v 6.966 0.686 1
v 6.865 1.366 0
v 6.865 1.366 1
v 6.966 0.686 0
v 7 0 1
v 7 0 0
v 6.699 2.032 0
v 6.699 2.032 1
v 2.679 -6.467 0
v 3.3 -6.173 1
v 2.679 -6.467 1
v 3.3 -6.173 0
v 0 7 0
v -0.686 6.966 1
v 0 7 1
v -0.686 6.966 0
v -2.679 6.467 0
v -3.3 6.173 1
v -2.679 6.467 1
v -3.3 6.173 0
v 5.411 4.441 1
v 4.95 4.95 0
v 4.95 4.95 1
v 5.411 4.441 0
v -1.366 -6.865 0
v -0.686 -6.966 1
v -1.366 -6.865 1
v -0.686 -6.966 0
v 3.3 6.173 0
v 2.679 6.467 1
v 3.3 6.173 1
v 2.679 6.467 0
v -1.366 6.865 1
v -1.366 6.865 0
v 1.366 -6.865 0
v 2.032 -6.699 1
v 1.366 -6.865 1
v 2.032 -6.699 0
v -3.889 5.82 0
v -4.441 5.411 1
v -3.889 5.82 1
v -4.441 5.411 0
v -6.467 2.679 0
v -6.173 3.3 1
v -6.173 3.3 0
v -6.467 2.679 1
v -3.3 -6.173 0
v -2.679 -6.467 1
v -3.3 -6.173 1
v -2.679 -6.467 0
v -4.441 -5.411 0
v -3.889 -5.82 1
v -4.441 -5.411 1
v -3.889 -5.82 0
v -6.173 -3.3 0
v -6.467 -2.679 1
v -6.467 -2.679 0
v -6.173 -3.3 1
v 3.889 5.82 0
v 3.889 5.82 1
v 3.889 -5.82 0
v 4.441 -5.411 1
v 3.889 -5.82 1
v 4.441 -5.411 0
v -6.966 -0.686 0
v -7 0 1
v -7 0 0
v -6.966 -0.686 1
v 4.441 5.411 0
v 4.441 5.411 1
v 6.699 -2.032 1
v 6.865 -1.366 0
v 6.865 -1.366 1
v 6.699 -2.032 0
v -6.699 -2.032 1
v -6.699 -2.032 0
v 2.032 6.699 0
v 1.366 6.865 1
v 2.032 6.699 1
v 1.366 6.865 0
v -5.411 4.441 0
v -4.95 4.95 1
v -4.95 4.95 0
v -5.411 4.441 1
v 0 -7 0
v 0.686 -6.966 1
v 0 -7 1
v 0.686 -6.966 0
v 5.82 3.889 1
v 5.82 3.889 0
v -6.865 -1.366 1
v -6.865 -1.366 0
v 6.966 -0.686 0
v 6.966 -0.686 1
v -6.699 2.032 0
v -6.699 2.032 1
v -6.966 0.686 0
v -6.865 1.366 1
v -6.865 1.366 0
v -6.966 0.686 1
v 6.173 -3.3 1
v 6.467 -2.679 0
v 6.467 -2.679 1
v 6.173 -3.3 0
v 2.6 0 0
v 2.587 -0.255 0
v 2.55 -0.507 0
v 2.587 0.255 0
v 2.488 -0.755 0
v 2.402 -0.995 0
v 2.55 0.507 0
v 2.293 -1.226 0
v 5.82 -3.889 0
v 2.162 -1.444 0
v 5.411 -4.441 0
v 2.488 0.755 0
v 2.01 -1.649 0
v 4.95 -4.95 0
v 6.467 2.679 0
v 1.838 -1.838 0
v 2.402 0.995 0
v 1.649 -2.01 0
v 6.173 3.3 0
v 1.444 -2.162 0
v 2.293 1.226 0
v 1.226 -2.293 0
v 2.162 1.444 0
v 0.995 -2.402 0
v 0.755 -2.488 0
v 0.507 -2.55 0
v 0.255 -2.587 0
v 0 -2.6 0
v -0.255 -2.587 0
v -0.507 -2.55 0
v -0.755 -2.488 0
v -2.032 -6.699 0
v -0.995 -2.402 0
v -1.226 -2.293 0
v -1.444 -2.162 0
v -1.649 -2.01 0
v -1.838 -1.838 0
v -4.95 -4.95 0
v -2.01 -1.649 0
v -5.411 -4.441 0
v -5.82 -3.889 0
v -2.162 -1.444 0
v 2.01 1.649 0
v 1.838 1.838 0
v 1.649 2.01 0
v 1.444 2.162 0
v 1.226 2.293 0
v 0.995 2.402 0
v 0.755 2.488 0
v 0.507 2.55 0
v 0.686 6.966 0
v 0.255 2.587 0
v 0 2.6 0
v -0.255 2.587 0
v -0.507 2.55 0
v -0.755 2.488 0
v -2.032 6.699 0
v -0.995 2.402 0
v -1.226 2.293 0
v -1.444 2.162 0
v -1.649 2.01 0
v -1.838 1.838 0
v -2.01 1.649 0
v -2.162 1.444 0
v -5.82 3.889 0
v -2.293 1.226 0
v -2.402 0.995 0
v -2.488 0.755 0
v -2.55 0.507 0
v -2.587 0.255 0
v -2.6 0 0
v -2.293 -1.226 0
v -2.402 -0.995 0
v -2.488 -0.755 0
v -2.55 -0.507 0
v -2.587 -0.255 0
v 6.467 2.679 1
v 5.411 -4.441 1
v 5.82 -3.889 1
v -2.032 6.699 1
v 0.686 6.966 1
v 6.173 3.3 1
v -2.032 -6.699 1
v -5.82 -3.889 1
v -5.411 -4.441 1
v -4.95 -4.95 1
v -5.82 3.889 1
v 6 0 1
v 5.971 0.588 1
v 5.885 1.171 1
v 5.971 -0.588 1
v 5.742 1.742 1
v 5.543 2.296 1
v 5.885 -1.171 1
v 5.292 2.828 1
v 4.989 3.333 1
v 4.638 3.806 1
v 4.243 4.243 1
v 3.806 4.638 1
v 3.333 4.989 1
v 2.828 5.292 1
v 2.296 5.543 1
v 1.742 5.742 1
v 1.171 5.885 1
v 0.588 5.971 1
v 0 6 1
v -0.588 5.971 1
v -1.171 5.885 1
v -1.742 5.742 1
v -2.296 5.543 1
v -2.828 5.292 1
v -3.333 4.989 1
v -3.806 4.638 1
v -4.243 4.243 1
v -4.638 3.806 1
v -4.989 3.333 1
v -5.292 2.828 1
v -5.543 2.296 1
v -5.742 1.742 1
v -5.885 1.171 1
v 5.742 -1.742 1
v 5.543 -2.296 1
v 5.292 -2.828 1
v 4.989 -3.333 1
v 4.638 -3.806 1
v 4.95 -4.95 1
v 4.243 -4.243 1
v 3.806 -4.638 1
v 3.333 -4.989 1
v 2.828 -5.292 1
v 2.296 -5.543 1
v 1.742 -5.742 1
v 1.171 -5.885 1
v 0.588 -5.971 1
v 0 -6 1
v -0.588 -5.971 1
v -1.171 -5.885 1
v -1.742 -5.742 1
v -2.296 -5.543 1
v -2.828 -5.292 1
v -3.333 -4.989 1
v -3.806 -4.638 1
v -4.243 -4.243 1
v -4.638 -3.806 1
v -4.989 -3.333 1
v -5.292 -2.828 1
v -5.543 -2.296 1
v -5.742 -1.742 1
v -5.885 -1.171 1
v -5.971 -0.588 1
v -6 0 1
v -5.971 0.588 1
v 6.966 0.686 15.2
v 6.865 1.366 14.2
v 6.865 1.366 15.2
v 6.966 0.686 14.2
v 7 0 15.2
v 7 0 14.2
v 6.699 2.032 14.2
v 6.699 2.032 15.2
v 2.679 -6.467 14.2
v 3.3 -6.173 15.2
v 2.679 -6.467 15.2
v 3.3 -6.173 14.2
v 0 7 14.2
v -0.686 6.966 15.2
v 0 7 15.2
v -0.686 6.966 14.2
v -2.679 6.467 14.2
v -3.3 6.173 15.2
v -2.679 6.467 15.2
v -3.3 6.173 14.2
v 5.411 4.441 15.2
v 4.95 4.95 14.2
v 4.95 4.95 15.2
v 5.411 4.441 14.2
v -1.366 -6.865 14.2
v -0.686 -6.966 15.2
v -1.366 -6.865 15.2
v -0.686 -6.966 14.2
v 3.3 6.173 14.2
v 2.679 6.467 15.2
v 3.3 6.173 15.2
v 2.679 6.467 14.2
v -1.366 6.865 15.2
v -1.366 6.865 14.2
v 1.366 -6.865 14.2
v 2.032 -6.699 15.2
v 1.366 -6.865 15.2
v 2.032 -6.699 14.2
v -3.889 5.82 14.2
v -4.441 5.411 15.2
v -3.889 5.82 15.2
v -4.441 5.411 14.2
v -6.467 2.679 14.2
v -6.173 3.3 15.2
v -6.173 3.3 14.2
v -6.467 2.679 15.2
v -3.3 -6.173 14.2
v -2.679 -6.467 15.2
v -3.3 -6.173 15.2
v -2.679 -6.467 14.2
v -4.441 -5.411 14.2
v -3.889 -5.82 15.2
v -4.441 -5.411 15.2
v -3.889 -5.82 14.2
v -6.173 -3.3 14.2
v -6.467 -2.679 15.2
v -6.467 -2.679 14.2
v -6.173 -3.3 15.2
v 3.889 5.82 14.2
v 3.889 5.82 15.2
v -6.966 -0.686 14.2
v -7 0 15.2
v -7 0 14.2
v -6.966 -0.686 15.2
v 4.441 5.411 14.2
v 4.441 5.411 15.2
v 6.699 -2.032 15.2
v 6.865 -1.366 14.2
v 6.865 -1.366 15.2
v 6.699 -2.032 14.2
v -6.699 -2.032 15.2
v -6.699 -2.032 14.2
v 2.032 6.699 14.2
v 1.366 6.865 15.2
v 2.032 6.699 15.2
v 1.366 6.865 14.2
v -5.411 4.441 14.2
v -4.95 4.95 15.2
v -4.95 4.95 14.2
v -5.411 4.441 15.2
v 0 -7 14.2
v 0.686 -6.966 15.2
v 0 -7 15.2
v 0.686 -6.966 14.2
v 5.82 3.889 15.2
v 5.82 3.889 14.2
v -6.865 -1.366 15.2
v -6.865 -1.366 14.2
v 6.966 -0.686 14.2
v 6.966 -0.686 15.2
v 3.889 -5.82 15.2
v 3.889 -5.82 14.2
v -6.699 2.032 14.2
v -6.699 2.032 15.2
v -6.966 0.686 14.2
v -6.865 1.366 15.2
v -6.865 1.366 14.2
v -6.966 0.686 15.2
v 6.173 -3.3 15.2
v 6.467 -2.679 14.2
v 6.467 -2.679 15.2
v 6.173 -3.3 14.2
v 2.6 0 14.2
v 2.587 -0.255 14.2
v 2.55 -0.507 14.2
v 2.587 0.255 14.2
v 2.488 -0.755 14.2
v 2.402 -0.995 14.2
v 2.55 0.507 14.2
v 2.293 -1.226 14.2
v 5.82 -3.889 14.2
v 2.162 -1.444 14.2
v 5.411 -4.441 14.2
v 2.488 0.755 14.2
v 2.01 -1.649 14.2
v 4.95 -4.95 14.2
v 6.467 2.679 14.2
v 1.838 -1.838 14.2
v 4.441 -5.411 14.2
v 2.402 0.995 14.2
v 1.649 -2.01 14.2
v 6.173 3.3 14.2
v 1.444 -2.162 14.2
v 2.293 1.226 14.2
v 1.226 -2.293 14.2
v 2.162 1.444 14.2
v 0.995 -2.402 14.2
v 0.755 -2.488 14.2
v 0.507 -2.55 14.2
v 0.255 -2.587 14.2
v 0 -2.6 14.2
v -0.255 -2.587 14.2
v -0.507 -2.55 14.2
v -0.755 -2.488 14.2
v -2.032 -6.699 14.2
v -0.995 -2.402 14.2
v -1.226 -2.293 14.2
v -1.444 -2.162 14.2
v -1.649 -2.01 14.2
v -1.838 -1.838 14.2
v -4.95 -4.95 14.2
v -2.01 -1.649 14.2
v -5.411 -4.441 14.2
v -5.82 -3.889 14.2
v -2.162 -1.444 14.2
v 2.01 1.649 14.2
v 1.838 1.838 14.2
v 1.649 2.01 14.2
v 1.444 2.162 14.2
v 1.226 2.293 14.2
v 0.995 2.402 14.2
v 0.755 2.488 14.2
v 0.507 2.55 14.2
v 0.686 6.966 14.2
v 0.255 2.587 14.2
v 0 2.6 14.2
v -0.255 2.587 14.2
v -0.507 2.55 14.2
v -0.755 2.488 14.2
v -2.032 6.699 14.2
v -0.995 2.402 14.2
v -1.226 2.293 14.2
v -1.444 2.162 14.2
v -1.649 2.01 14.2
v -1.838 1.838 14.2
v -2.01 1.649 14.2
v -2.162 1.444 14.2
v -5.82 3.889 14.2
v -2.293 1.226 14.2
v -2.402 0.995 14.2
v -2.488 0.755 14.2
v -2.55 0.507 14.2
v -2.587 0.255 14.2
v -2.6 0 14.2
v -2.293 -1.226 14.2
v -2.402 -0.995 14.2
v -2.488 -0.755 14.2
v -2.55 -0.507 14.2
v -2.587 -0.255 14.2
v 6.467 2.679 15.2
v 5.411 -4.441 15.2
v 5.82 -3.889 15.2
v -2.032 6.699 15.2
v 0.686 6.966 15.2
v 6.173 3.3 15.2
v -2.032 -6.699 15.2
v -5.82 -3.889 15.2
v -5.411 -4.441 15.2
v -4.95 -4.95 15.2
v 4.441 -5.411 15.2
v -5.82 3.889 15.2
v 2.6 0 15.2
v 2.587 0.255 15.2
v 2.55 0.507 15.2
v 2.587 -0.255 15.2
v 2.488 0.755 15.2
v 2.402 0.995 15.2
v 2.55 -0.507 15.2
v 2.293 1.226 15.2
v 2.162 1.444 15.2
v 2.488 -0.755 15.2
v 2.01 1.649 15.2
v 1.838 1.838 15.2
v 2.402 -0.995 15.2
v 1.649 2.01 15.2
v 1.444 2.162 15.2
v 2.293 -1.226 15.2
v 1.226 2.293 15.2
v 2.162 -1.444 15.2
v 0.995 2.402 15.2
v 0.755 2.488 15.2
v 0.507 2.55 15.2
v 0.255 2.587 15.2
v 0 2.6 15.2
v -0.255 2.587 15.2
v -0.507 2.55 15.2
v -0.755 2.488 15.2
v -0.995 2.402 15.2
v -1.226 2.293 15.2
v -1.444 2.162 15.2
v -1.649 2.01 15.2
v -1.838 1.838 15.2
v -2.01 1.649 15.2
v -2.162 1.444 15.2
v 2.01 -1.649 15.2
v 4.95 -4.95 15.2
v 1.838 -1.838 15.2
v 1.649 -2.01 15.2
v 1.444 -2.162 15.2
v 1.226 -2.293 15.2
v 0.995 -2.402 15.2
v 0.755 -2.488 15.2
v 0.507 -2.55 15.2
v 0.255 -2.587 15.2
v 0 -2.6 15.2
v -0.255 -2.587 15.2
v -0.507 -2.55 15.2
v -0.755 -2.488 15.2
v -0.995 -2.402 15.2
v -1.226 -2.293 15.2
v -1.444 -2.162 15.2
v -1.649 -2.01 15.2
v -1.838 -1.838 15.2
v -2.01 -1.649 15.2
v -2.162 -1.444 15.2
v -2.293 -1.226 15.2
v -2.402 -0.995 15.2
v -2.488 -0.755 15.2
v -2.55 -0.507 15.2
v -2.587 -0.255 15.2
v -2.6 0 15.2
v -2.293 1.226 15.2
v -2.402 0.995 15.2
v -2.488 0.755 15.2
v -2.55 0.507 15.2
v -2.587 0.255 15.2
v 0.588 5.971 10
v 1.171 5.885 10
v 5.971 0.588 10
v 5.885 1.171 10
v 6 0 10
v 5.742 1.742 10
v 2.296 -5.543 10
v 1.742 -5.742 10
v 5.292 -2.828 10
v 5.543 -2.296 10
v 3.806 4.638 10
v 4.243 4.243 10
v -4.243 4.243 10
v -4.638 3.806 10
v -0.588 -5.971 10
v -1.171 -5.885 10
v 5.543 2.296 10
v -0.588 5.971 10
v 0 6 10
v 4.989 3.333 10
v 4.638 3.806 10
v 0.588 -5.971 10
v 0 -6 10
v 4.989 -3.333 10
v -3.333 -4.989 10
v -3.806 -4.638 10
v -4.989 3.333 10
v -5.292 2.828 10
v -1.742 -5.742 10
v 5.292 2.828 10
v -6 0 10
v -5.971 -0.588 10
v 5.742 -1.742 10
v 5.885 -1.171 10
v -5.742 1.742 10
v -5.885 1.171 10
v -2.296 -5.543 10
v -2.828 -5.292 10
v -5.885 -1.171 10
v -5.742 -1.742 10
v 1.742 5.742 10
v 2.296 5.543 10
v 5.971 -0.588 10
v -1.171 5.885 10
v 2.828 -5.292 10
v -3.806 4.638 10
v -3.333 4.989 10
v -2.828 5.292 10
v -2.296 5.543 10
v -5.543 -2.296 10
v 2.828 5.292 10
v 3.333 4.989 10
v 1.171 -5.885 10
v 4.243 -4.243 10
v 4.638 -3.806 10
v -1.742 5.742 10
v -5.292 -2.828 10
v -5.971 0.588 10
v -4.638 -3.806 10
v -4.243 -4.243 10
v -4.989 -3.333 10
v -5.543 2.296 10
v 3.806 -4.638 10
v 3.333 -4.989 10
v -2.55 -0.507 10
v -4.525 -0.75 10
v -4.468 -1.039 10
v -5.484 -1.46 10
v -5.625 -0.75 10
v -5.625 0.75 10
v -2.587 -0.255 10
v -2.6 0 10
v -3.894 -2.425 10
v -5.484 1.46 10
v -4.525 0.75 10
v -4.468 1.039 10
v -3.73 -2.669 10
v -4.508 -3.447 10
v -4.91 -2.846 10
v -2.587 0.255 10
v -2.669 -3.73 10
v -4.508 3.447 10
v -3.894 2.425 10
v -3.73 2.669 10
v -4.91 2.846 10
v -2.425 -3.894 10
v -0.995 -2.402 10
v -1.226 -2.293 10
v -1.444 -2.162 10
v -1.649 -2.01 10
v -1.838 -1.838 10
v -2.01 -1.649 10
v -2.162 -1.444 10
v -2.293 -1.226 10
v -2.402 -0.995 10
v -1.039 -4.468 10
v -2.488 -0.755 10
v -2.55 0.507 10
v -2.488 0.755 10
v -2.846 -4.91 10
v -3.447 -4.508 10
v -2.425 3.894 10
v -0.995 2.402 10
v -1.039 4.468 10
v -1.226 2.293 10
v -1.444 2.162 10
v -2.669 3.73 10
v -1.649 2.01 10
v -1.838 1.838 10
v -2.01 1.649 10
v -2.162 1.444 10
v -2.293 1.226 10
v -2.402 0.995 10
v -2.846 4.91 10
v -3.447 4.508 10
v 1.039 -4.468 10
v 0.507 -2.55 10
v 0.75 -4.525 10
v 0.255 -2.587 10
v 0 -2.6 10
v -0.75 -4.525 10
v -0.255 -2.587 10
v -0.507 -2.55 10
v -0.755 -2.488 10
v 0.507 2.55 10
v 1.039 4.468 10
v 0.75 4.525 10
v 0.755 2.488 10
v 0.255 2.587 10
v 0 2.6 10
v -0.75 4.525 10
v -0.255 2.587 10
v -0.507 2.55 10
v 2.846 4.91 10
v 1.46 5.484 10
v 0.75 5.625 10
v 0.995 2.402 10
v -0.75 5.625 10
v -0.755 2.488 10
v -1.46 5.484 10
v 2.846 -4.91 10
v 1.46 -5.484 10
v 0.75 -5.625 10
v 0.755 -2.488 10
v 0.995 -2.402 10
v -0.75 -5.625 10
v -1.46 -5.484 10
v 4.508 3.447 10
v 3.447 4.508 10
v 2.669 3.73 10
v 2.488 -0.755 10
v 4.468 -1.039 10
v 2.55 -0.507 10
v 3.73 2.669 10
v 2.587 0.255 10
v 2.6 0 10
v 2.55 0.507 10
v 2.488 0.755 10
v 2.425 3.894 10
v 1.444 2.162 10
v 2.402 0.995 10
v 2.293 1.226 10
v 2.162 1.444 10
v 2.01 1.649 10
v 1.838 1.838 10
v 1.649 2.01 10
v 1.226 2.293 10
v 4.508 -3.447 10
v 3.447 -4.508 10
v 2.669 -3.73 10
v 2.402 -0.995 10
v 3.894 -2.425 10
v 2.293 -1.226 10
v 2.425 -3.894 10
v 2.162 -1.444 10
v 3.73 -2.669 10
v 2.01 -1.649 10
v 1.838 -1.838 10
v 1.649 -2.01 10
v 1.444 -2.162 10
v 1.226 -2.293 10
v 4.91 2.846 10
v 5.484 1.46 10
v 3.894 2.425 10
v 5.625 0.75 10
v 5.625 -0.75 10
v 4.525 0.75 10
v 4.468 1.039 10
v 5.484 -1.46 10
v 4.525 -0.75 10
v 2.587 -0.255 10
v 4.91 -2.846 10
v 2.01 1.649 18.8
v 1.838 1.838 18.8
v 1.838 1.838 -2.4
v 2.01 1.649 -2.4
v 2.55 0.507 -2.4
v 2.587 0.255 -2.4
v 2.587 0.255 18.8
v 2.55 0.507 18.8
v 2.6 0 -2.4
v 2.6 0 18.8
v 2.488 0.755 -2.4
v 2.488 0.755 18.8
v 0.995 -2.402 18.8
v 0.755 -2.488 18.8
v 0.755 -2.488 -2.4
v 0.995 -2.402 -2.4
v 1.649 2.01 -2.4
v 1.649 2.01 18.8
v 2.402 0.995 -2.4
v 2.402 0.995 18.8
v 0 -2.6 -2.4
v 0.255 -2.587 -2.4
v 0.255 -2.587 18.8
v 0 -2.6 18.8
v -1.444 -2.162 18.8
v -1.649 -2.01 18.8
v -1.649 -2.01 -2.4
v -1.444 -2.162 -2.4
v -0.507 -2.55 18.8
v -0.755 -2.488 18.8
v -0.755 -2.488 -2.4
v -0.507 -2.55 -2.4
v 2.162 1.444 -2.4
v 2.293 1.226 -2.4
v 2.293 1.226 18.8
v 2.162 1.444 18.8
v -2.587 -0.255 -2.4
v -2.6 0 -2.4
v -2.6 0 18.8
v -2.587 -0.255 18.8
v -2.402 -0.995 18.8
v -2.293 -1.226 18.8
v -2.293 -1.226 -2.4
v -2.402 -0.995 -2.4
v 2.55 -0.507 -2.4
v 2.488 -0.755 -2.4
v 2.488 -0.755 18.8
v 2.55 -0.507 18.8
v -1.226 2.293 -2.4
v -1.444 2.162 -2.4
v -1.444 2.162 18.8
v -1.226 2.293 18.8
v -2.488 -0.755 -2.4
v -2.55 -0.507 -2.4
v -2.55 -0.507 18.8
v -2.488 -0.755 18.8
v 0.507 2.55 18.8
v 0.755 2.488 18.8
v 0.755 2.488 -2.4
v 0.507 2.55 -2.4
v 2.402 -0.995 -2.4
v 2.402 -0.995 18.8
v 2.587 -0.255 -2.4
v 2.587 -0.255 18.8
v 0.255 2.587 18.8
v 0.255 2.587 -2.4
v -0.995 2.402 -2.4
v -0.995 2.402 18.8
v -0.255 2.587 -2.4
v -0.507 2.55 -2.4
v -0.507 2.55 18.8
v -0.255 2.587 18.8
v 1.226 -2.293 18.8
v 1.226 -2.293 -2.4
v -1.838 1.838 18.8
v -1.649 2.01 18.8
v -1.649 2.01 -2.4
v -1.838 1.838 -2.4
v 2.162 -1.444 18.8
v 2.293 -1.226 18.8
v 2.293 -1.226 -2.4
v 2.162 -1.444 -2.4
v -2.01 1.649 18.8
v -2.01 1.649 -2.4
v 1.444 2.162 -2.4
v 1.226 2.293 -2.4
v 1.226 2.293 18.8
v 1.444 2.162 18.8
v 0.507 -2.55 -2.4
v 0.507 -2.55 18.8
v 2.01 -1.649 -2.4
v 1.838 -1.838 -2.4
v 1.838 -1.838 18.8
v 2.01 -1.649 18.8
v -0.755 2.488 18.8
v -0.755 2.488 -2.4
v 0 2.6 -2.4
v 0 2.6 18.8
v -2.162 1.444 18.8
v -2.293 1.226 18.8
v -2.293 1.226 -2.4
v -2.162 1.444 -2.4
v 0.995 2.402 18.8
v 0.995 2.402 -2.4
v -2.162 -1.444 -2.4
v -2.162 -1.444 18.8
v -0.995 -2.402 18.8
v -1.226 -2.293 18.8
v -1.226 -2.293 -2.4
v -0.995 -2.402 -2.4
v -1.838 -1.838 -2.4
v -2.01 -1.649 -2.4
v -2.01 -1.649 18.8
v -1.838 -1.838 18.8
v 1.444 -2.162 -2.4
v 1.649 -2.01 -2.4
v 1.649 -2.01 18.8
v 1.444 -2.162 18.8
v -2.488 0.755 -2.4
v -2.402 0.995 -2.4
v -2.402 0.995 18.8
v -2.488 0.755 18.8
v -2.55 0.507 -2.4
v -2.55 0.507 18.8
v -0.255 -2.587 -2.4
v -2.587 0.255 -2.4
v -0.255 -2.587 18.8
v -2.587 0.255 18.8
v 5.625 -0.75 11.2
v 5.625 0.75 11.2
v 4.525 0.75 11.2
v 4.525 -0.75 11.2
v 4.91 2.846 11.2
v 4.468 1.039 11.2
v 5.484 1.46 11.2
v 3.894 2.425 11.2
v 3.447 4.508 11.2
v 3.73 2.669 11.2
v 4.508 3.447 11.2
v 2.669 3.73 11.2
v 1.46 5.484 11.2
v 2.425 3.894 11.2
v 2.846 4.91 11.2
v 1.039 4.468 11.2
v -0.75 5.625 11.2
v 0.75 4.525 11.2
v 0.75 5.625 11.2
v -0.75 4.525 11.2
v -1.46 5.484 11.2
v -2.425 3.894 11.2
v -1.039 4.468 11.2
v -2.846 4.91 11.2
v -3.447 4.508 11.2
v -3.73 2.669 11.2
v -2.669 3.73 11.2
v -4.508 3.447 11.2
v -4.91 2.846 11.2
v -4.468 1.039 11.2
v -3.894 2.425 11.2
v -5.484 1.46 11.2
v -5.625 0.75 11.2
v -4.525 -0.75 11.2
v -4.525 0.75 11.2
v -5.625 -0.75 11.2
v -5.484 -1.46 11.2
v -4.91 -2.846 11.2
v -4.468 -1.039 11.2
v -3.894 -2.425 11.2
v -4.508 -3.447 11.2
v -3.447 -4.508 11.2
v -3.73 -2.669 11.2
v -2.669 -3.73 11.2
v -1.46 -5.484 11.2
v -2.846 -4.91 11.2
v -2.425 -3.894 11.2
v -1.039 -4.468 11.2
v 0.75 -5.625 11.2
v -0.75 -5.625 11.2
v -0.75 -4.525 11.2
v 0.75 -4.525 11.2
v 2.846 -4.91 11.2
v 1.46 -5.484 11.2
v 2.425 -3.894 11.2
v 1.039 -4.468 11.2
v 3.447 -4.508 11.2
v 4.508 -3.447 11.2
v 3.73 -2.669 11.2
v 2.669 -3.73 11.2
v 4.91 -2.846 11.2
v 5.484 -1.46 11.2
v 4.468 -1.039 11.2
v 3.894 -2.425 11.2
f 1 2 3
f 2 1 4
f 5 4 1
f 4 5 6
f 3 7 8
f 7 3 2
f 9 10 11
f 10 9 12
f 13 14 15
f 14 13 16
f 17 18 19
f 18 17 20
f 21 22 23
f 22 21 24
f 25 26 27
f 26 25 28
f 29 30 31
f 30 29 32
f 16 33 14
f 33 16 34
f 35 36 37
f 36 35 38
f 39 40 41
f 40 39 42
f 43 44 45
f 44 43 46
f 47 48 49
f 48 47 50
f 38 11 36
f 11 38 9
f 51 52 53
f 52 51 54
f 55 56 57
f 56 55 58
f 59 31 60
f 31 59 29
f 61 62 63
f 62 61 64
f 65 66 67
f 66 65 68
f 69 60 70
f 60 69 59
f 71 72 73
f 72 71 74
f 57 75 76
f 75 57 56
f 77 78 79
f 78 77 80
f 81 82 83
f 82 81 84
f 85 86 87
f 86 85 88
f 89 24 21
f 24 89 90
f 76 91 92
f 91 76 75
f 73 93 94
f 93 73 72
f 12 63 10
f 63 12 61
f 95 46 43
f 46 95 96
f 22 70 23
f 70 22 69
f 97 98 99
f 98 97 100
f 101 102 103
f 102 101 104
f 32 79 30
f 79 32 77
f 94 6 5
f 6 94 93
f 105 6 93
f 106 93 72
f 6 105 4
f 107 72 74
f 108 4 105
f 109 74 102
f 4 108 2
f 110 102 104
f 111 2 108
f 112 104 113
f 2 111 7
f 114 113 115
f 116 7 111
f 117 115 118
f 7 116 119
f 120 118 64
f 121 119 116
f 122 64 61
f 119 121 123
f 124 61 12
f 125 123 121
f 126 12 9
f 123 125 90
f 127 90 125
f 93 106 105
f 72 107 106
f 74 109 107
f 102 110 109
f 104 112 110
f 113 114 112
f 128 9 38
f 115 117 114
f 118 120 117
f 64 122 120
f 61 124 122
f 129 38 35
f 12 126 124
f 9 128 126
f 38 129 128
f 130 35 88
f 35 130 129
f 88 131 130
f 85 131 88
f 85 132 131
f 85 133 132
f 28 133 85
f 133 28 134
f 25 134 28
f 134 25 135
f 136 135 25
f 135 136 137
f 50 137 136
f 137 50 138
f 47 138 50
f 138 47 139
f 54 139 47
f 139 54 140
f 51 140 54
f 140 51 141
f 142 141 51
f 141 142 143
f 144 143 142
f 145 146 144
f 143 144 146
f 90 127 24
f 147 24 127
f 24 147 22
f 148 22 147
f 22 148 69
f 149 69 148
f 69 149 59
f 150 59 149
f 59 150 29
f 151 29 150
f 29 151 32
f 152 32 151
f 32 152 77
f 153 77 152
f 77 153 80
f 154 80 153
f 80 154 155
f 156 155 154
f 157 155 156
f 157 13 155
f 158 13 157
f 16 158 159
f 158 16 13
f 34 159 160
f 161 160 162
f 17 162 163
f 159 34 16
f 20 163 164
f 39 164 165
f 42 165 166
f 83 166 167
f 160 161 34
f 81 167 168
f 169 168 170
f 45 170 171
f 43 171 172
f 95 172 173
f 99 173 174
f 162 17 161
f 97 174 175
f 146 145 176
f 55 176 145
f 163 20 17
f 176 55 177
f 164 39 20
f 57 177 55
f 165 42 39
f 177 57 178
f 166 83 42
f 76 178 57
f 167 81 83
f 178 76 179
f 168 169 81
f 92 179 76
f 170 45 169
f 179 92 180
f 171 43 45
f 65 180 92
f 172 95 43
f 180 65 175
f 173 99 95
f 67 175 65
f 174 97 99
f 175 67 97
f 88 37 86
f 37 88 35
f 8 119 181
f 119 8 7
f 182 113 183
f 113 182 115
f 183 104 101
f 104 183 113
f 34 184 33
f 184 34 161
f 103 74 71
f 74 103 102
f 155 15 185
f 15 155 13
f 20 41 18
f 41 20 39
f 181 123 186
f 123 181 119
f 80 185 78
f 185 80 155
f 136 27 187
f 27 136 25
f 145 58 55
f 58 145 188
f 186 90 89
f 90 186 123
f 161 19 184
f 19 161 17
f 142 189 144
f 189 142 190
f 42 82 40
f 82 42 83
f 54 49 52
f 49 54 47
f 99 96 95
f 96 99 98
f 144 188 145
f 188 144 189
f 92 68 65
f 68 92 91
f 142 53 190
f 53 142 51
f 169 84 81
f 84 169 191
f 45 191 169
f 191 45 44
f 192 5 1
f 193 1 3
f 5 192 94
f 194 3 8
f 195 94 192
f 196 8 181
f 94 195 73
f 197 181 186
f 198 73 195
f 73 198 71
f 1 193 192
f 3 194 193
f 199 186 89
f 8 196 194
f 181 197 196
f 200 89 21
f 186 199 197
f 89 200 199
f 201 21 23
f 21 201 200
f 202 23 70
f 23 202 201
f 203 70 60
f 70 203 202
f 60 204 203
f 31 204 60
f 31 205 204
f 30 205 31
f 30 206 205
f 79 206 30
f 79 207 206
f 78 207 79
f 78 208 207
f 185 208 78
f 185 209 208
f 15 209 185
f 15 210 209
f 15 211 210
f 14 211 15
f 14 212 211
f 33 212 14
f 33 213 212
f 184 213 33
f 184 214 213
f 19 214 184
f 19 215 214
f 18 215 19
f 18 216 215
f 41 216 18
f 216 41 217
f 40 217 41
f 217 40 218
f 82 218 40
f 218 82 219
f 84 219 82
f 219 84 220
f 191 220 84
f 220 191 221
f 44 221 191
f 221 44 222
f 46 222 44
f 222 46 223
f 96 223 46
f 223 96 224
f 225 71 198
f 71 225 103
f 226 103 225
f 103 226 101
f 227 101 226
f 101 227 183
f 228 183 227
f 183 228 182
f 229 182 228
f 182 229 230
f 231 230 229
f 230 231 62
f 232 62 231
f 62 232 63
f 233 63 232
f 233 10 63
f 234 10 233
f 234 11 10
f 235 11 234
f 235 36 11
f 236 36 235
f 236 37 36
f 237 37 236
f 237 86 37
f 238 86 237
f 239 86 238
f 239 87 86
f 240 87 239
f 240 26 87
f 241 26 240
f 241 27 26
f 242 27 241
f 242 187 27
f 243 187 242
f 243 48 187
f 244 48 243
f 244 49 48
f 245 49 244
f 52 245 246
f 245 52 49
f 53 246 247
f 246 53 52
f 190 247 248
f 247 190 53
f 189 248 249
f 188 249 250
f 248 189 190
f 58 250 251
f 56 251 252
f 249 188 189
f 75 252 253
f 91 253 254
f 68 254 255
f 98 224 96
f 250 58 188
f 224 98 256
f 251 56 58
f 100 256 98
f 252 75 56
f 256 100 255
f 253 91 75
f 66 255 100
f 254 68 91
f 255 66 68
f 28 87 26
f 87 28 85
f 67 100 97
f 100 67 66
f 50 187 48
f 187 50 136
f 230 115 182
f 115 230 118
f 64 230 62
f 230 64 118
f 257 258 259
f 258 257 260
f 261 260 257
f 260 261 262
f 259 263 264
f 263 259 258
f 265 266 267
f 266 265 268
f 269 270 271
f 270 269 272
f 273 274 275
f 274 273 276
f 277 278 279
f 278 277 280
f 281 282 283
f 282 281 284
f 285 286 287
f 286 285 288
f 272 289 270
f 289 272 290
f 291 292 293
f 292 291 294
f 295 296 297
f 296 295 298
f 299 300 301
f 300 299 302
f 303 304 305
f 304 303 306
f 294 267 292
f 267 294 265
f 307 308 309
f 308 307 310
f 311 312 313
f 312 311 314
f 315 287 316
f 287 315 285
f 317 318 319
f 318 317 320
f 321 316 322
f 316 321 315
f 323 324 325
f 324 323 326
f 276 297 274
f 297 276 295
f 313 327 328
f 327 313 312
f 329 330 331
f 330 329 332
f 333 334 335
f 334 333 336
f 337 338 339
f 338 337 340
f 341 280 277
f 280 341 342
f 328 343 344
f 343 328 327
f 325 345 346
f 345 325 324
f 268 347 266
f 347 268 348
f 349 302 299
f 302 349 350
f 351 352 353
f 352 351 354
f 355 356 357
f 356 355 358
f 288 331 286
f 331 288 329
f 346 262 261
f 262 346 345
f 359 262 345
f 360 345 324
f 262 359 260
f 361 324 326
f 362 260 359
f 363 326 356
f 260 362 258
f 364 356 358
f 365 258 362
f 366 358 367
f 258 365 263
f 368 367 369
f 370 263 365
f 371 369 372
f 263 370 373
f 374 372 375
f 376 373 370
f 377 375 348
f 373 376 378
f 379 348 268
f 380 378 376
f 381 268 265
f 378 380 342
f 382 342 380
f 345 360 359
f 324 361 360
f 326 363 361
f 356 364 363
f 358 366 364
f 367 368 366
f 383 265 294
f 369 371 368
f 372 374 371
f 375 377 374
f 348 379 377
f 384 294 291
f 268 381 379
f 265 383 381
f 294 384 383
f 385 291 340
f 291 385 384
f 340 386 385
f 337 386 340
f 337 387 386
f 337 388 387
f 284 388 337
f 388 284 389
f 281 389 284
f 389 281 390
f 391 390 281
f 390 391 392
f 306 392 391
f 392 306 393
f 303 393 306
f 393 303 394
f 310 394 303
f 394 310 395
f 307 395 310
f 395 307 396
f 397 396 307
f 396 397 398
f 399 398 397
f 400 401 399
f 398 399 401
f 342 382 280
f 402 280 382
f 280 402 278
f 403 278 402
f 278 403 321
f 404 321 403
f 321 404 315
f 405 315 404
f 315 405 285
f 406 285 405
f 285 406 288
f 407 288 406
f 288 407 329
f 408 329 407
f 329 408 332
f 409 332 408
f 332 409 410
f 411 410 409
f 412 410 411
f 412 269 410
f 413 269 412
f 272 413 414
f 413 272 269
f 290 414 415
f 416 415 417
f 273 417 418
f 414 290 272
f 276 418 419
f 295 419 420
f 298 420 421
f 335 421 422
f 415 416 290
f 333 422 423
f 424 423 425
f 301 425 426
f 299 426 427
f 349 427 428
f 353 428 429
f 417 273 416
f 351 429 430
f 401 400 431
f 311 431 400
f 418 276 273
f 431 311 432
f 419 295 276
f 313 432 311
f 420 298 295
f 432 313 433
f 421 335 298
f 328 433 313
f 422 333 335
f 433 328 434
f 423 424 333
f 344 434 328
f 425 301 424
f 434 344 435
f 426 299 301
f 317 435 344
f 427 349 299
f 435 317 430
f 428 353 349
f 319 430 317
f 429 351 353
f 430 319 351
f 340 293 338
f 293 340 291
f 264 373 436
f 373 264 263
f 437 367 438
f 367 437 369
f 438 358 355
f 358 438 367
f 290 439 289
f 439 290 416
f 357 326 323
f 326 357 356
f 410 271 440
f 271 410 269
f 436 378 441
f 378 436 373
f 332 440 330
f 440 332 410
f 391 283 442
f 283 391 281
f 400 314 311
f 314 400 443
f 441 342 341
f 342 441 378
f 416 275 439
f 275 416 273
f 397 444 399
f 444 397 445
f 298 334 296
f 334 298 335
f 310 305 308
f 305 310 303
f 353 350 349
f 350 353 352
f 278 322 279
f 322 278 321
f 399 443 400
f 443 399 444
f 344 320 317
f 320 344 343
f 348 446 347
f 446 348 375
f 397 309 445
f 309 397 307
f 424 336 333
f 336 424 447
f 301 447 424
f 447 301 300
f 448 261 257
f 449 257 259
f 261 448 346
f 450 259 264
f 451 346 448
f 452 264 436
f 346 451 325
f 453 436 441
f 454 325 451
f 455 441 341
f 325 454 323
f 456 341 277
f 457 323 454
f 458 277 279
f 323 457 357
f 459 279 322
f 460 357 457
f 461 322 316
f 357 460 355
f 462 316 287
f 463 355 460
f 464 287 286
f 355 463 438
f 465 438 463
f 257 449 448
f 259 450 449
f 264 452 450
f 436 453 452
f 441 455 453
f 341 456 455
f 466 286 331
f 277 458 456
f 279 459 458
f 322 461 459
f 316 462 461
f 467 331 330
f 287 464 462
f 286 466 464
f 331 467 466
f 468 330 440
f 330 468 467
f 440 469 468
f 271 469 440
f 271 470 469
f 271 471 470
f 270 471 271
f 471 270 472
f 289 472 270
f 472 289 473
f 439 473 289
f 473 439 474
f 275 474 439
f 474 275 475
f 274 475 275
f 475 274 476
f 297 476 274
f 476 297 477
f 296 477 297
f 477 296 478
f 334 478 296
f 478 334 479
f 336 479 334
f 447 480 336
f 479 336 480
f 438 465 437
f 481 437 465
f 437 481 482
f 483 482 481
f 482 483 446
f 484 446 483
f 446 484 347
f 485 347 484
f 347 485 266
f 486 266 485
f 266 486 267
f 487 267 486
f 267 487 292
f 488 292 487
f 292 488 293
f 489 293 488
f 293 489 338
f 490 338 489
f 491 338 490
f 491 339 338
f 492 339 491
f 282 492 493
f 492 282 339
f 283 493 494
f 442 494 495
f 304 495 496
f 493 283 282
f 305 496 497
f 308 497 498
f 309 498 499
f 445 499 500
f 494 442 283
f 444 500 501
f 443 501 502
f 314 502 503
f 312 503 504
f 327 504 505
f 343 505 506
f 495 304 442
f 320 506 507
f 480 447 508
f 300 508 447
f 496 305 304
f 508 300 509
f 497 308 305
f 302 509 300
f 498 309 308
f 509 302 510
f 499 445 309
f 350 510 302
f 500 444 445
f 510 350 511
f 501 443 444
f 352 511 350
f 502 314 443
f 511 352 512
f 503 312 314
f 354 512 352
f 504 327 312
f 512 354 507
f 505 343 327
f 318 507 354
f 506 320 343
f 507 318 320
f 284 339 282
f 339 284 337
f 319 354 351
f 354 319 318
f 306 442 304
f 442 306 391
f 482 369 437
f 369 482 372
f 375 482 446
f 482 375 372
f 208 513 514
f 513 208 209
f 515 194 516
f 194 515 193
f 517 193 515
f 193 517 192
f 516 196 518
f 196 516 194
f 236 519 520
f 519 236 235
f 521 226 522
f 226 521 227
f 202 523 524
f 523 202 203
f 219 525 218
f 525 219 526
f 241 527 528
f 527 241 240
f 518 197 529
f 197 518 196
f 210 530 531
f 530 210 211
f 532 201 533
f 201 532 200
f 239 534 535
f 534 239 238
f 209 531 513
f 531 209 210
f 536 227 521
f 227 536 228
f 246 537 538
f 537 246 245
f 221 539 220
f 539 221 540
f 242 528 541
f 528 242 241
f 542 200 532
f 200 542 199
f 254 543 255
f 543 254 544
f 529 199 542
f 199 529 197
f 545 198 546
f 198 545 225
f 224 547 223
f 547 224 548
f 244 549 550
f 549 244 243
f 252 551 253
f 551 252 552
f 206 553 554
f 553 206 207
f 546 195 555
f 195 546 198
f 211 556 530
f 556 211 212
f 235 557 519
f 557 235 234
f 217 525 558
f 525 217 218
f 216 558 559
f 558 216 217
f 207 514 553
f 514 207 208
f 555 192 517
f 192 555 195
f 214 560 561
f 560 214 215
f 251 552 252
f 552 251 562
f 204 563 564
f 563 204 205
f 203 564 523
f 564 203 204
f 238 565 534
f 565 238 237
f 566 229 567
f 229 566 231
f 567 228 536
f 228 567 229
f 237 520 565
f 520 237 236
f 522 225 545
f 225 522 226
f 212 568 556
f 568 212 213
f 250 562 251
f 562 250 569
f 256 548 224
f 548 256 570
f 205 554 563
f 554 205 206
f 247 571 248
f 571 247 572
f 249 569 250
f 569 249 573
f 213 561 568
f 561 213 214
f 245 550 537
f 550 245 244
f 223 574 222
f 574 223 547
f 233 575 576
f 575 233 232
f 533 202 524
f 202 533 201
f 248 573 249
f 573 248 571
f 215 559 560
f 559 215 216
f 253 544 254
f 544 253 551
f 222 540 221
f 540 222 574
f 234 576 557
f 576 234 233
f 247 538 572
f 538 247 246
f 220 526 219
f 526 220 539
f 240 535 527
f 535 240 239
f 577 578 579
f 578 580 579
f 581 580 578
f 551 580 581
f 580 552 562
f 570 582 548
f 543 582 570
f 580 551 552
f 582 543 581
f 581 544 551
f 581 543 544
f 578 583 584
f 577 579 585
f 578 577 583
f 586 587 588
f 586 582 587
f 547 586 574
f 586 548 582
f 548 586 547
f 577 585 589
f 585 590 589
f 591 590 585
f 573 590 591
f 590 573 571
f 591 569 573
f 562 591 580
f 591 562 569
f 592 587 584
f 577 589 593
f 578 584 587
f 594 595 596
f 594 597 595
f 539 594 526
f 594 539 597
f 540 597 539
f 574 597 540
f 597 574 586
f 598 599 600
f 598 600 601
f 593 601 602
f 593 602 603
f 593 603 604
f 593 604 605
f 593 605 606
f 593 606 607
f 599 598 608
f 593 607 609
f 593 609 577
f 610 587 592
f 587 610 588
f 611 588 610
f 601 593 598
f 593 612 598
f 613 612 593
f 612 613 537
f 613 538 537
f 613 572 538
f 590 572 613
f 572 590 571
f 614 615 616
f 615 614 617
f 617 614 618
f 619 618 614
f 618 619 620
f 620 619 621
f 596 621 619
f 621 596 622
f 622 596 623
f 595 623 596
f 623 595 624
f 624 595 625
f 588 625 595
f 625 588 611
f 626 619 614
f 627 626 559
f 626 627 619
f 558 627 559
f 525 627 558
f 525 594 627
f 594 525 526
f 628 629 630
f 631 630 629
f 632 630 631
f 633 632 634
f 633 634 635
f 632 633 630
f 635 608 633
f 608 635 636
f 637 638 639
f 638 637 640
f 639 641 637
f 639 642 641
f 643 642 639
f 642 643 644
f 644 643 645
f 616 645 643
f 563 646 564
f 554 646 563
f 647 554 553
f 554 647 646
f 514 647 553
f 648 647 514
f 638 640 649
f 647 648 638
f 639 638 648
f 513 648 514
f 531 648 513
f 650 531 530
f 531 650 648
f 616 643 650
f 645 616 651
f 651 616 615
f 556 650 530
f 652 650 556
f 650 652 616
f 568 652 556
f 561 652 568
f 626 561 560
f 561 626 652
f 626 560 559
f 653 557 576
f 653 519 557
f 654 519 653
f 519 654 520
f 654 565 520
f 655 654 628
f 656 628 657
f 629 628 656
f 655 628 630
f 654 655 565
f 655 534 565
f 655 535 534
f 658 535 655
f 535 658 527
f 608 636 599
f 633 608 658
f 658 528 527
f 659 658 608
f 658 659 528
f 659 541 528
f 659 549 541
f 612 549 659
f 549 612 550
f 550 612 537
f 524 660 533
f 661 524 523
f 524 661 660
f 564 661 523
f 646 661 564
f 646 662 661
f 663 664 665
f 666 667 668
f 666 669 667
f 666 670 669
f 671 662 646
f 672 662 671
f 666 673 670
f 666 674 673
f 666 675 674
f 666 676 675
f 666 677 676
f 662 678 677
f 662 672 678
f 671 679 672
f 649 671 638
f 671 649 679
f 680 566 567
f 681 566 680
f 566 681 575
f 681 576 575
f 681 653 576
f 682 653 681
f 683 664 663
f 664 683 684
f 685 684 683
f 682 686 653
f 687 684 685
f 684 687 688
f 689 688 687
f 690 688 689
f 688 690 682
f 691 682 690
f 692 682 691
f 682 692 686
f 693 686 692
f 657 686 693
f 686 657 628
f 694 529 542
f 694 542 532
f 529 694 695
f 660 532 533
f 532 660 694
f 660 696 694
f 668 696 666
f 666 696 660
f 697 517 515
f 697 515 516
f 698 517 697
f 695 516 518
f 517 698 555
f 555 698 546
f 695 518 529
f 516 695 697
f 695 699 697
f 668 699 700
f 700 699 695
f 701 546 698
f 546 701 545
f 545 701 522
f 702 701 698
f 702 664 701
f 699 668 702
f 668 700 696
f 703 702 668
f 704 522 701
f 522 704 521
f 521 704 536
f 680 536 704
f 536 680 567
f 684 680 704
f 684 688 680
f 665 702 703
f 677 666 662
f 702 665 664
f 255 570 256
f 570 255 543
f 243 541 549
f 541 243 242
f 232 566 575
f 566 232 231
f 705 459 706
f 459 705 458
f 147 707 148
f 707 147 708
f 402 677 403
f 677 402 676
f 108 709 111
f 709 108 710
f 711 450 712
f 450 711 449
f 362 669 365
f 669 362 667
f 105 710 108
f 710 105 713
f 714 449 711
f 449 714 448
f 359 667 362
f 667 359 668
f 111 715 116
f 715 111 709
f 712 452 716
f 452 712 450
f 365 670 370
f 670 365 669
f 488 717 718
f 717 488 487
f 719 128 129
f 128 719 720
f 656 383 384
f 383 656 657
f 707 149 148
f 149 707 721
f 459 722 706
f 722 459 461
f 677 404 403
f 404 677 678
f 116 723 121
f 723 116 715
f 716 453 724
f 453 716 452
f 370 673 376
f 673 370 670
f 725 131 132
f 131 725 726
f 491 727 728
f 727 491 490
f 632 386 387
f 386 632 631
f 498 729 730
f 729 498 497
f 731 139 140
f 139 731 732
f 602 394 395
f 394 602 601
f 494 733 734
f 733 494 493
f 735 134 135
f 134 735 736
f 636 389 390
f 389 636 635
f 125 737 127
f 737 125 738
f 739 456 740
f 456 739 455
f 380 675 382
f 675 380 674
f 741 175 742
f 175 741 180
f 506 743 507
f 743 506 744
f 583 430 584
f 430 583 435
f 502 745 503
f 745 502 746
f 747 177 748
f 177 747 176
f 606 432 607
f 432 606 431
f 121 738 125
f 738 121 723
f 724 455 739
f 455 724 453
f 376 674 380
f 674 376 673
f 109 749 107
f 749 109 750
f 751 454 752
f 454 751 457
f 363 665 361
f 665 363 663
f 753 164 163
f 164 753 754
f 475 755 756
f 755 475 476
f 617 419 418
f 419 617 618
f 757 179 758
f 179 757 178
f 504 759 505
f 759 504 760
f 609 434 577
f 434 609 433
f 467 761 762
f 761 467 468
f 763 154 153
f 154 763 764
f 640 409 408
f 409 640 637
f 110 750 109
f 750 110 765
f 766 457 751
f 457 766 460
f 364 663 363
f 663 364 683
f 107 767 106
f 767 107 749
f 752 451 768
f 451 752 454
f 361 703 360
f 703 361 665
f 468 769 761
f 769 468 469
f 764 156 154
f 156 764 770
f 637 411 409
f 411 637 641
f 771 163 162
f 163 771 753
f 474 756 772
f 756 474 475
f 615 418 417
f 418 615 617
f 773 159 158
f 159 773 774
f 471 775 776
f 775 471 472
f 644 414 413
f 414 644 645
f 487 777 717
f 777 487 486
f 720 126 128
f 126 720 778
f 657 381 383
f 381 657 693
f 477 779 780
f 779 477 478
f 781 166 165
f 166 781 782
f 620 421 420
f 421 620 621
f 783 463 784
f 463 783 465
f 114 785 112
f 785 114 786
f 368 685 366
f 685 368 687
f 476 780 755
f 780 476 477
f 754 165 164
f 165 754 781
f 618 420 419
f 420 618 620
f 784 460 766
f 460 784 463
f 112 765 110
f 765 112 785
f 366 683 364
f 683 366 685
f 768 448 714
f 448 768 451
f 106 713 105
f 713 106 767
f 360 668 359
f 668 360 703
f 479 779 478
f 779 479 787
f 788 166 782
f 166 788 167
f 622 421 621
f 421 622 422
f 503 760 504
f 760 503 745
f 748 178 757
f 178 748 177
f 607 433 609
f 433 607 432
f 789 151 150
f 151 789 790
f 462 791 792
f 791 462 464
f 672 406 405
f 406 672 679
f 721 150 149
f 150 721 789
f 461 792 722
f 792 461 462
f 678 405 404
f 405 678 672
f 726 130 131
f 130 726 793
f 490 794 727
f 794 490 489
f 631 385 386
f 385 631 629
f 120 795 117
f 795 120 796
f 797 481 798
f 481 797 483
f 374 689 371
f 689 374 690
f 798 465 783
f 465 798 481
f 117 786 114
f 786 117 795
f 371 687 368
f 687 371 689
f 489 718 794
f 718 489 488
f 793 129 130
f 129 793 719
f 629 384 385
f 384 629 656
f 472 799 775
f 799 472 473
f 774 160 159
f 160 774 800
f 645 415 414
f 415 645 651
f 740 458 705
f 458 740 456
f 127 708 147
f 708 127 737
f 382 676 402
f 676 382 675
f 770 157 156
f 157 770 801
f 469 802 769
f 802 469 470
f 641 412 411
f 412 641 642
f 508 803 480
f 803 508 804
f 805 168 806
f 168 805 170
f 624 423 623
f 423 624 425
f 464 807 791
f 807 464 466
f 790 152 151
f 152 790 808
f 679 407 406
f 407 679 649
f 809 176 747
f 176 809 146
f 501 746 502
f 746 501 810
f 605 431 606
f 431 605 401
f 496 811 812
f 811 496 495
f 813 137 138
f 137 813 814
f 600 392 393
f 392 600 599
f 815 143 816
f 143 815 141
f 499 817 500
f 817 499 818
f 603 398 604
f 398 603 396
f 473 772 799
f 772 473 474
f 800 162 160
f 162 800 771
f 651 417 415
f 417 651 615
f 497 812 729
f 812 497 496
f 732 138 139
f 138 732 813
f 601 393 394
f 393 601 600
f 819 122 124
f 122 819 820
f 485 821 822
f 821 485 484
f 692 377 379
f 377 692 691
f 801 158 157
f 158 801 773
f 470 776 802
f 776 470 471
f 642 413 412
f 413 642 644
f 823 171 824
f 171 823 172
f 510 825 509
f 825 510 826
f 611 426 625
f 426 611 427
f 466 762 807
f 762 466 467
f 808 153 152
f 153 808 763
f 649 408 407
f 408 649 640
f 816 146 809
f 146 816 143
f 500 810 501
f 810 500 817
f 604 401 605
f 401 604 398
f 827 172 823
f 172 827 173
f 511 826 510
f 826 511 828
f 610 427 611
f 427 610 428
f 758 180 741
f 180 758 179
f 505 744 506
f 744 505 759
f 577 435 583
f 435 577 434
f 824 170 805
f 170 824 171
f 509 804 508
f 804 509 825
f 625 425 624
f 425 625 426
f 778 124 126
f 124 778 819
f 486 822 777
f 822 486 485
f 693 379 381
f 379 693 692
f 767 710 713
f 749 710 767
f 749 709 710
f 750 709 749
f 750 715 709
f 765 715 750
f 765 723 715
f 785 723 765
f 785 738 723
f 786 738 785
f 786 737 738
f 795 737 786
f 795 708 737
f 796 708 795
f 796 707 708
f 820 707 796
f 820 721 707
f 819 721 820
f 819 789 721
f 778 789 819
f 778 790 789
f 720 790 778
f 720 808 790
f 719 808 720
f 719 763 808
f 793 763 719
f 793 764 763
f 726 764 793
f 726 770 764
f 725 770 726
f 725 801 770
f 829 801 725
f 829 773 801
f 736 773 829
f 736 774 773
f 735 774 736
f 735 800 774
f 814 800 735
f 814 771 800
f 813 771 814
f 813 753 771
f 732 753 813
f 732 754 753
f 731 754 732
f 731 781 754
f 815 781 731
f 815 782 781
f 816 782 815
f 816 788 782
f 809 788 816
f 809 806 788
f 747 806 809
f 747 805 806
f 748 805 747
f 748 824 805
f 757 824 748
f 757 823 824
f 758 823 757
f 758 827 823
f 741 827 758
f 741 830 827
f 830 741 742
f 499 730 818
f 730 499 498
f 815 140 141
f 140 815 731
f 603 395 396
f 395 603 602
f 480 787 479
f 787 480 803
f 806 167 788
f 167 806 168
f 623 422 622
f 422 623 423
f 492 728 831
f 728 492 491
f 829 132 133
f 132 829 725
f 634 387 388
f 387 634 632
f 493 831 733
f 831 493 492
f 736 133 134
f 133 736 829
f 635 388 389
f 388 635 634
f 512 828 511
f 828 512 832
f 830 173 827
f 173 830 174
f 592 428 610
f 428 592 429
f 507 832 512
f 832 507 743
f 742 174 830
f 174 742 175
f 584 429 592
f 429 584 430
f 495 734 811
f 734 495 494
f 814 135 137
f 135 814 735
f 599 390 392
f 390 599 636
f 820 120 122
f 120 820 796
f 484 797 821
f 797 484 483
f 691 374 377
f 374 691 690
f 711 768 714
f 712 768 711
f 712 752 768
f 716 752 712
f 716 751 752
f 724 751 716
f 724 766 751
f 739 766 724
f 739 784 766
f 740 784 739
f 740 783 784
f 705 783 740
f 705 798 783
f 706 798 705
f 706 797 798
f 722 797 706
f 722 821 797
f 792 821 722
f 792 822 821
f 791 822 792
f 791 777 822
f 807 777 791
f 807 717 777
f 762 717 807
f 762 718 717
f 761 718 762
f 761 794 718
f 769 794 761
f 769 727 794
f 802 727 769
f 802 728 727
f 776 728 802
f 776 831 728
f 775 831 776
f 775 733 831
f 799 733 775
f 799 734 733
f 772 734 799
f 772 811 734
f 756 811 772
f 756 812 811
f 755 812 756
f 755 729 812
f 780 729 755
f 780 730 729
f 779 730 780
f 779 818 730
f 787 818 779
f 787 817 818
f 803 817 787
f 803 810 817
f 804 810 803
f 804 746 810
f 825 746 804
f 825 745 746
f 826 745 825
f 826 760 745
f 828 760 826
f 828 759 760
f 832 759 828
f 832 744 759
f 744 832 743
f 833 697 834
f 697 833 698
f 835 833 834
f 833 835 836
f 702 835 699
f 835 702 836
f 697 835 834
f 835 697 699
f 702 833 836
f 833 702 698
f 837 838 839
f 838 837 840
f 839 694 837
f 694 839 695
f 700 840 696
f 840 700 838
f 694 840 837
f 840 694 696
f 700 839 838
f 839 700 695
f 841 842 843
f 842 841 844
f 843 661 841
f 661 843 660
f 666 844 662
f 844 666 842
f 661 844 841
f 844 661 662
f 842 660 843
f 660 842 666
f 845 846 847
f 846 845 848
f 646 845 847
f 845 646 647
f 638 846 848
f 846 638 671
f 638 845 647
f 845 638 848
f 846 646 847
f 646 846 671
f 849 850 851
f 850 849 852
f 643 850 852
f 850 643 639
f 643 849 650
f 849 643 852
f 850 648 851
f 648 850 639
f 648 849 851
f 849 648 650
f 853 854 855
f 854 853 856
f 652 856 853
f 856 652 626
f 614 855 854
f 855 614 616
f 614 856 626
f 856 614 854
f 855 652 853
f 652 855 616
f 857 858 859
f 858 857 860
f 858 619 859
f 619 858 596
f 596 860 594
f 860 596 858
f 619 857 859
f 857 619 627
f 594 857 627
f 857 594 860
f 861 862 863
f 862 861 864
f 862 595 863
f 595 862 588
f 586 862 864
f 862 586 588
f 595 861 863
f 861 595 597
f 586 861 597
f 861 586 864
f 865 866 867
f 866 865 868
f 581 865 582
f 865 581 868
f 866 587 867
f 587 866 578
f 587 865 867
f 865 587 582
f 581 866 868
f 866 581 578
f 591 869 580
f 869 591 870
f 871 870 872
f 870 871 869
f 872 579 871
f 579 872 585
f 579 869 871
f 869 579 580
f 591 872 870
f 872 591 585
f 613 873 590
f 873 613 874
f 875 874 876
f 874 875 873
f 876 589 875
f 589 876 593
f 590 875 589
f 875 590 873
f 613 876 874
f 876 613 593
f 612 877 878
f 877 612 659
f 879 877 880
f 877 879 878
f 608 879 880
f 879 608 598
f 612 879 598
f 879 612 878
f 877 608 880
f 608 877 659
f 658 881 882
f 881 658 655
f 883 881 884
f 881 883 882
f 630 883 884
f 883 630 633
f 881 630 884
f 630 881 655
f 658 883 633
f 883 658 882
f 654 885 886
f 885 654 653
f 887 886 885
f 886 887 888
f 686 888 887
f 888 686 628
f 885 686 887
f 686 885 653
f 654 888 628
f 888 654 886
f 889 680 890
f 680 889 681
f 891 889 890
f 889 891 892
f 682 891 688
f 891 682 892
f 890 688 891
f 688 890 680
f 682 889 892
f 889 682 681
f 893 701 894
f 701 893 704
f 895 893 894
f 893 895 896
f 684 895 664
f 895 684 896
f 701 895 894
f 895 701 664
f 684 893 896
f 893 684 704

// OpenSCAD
// Parameters
tooth_count = 16; //[8:64:1]
pitch_diameter_mm = 9.65; //[5:20:0.01]
pitch_mm = 2; //[1:5:0.01]
pulley_width_mm = 6; //[3:20:0.1]
bore_diameter_mm = 5; //[1:12:0.01]
hub_diameter_mm = 12; //[6:24:0.1]
hub_length_mm = 10; //[4:30:0.1]
flange_enabled = 1; //[0:1:1]
flange_diameter_mm = 14; //[8:30:0.1]
flange_thickness_mm = 1; //[0.6:3:0.1]
set_screw_enabled = 0; //[0:1:1]
set_screw_count = 1; //[1:4:1]
set_screw_diameter_mm = 3; //[2:6:0.1]
set_screw_z_mm = 5; //[0:20:0.1]
tolerance_mm = 0.2; //[0:0.6:0.01]
overlap_mm = 0.8; //[0.2:2:0.1]
tooth_radial_height_mm = 0.8; //[0.4:1.6:0.01]
tooth_tangential_width_mm = 1.5; //[0.8:3:0.01]
tooth_root_clearance_mm = 0.3; //[0.1:0.8:0.01]
hub_to_teeth_overlap_mm = 0.8; //[0.2:2:0.1]

// Pulley - complete geometry
module pulley() {
  color("Silver") {
    // Hub
    translate([0, 0, hub_length_mm/2])
      cylinder(h=hub_length_mm, r=hub_diameter_mm/2, center=true, $fn=64);
    
    // Flanges
    if (flange_enabled) {
      translate([0, 0, flange_thickness_mm/2])
        cylinder(h=flange_thickness_mm, r=flange_diameter_mm/2, center=true, $fn=64);
      translate([0, 0, hub_length_mm + pulley_width_mm - flange_thickness_mm/2 - hub_to_teeth_overlap_mm])
        cylinder(h=flange_thickness_mm, r=flange_diameter_mm/2, center=true, $fn=64);
    }
    
    // Bore
    translate([0, 0, hub_length_mm/2 + flange_thickness_mm*flange_enabled + pulley_width_mm/2 - hub_to_teeth_overlap_mm])
      cylinder(h=hub_length_mm + pulley_width_mm + 2*flange_thickness_mm + 4*overlap_mm, r=(bore_diameter_mm + tolerance_mm)/2, center=true, $fn=64);
  }
}

// Printed Pulley Teeth From Profile - complete geometry
module printed_pulley_teeth_from_profile() {
  color("DimGray") {
    for (i = [0:tooth_count-1]) {
      rotate([0, 0, i*360/tooth_count])
        translate([pitch_diameter_mm/2 + (tooth_radial_height_mm + tooth_root_clearance_mm)/2 - tooth_root_clearance_mm, 0, hub_length_mm/2 + flange_thickness_mm*flange_enabled + pulley_width_mm/2 - hub_to_teeth_overlap_mm])
          cube([tooth_radial_height_mm + tooth_root_clearance_mm, tooth_tangential_width_mm, pulley_width_mm], center=true);
    }
  }
}

// Printed Pulley GT2 Teeth - complete geometry
module printed_pulley_GT2_teeth() {
  printed_pulley_teeth_from_profile();
}

// Printed Pulley Teeth - complete geometry
module printed_pulley_teeth() {
  printed_pulley_GT2_teeth();
}

// Assembly
module assembly() {
  pulley();
  printed_pulley_teeth();
}

assembly();
